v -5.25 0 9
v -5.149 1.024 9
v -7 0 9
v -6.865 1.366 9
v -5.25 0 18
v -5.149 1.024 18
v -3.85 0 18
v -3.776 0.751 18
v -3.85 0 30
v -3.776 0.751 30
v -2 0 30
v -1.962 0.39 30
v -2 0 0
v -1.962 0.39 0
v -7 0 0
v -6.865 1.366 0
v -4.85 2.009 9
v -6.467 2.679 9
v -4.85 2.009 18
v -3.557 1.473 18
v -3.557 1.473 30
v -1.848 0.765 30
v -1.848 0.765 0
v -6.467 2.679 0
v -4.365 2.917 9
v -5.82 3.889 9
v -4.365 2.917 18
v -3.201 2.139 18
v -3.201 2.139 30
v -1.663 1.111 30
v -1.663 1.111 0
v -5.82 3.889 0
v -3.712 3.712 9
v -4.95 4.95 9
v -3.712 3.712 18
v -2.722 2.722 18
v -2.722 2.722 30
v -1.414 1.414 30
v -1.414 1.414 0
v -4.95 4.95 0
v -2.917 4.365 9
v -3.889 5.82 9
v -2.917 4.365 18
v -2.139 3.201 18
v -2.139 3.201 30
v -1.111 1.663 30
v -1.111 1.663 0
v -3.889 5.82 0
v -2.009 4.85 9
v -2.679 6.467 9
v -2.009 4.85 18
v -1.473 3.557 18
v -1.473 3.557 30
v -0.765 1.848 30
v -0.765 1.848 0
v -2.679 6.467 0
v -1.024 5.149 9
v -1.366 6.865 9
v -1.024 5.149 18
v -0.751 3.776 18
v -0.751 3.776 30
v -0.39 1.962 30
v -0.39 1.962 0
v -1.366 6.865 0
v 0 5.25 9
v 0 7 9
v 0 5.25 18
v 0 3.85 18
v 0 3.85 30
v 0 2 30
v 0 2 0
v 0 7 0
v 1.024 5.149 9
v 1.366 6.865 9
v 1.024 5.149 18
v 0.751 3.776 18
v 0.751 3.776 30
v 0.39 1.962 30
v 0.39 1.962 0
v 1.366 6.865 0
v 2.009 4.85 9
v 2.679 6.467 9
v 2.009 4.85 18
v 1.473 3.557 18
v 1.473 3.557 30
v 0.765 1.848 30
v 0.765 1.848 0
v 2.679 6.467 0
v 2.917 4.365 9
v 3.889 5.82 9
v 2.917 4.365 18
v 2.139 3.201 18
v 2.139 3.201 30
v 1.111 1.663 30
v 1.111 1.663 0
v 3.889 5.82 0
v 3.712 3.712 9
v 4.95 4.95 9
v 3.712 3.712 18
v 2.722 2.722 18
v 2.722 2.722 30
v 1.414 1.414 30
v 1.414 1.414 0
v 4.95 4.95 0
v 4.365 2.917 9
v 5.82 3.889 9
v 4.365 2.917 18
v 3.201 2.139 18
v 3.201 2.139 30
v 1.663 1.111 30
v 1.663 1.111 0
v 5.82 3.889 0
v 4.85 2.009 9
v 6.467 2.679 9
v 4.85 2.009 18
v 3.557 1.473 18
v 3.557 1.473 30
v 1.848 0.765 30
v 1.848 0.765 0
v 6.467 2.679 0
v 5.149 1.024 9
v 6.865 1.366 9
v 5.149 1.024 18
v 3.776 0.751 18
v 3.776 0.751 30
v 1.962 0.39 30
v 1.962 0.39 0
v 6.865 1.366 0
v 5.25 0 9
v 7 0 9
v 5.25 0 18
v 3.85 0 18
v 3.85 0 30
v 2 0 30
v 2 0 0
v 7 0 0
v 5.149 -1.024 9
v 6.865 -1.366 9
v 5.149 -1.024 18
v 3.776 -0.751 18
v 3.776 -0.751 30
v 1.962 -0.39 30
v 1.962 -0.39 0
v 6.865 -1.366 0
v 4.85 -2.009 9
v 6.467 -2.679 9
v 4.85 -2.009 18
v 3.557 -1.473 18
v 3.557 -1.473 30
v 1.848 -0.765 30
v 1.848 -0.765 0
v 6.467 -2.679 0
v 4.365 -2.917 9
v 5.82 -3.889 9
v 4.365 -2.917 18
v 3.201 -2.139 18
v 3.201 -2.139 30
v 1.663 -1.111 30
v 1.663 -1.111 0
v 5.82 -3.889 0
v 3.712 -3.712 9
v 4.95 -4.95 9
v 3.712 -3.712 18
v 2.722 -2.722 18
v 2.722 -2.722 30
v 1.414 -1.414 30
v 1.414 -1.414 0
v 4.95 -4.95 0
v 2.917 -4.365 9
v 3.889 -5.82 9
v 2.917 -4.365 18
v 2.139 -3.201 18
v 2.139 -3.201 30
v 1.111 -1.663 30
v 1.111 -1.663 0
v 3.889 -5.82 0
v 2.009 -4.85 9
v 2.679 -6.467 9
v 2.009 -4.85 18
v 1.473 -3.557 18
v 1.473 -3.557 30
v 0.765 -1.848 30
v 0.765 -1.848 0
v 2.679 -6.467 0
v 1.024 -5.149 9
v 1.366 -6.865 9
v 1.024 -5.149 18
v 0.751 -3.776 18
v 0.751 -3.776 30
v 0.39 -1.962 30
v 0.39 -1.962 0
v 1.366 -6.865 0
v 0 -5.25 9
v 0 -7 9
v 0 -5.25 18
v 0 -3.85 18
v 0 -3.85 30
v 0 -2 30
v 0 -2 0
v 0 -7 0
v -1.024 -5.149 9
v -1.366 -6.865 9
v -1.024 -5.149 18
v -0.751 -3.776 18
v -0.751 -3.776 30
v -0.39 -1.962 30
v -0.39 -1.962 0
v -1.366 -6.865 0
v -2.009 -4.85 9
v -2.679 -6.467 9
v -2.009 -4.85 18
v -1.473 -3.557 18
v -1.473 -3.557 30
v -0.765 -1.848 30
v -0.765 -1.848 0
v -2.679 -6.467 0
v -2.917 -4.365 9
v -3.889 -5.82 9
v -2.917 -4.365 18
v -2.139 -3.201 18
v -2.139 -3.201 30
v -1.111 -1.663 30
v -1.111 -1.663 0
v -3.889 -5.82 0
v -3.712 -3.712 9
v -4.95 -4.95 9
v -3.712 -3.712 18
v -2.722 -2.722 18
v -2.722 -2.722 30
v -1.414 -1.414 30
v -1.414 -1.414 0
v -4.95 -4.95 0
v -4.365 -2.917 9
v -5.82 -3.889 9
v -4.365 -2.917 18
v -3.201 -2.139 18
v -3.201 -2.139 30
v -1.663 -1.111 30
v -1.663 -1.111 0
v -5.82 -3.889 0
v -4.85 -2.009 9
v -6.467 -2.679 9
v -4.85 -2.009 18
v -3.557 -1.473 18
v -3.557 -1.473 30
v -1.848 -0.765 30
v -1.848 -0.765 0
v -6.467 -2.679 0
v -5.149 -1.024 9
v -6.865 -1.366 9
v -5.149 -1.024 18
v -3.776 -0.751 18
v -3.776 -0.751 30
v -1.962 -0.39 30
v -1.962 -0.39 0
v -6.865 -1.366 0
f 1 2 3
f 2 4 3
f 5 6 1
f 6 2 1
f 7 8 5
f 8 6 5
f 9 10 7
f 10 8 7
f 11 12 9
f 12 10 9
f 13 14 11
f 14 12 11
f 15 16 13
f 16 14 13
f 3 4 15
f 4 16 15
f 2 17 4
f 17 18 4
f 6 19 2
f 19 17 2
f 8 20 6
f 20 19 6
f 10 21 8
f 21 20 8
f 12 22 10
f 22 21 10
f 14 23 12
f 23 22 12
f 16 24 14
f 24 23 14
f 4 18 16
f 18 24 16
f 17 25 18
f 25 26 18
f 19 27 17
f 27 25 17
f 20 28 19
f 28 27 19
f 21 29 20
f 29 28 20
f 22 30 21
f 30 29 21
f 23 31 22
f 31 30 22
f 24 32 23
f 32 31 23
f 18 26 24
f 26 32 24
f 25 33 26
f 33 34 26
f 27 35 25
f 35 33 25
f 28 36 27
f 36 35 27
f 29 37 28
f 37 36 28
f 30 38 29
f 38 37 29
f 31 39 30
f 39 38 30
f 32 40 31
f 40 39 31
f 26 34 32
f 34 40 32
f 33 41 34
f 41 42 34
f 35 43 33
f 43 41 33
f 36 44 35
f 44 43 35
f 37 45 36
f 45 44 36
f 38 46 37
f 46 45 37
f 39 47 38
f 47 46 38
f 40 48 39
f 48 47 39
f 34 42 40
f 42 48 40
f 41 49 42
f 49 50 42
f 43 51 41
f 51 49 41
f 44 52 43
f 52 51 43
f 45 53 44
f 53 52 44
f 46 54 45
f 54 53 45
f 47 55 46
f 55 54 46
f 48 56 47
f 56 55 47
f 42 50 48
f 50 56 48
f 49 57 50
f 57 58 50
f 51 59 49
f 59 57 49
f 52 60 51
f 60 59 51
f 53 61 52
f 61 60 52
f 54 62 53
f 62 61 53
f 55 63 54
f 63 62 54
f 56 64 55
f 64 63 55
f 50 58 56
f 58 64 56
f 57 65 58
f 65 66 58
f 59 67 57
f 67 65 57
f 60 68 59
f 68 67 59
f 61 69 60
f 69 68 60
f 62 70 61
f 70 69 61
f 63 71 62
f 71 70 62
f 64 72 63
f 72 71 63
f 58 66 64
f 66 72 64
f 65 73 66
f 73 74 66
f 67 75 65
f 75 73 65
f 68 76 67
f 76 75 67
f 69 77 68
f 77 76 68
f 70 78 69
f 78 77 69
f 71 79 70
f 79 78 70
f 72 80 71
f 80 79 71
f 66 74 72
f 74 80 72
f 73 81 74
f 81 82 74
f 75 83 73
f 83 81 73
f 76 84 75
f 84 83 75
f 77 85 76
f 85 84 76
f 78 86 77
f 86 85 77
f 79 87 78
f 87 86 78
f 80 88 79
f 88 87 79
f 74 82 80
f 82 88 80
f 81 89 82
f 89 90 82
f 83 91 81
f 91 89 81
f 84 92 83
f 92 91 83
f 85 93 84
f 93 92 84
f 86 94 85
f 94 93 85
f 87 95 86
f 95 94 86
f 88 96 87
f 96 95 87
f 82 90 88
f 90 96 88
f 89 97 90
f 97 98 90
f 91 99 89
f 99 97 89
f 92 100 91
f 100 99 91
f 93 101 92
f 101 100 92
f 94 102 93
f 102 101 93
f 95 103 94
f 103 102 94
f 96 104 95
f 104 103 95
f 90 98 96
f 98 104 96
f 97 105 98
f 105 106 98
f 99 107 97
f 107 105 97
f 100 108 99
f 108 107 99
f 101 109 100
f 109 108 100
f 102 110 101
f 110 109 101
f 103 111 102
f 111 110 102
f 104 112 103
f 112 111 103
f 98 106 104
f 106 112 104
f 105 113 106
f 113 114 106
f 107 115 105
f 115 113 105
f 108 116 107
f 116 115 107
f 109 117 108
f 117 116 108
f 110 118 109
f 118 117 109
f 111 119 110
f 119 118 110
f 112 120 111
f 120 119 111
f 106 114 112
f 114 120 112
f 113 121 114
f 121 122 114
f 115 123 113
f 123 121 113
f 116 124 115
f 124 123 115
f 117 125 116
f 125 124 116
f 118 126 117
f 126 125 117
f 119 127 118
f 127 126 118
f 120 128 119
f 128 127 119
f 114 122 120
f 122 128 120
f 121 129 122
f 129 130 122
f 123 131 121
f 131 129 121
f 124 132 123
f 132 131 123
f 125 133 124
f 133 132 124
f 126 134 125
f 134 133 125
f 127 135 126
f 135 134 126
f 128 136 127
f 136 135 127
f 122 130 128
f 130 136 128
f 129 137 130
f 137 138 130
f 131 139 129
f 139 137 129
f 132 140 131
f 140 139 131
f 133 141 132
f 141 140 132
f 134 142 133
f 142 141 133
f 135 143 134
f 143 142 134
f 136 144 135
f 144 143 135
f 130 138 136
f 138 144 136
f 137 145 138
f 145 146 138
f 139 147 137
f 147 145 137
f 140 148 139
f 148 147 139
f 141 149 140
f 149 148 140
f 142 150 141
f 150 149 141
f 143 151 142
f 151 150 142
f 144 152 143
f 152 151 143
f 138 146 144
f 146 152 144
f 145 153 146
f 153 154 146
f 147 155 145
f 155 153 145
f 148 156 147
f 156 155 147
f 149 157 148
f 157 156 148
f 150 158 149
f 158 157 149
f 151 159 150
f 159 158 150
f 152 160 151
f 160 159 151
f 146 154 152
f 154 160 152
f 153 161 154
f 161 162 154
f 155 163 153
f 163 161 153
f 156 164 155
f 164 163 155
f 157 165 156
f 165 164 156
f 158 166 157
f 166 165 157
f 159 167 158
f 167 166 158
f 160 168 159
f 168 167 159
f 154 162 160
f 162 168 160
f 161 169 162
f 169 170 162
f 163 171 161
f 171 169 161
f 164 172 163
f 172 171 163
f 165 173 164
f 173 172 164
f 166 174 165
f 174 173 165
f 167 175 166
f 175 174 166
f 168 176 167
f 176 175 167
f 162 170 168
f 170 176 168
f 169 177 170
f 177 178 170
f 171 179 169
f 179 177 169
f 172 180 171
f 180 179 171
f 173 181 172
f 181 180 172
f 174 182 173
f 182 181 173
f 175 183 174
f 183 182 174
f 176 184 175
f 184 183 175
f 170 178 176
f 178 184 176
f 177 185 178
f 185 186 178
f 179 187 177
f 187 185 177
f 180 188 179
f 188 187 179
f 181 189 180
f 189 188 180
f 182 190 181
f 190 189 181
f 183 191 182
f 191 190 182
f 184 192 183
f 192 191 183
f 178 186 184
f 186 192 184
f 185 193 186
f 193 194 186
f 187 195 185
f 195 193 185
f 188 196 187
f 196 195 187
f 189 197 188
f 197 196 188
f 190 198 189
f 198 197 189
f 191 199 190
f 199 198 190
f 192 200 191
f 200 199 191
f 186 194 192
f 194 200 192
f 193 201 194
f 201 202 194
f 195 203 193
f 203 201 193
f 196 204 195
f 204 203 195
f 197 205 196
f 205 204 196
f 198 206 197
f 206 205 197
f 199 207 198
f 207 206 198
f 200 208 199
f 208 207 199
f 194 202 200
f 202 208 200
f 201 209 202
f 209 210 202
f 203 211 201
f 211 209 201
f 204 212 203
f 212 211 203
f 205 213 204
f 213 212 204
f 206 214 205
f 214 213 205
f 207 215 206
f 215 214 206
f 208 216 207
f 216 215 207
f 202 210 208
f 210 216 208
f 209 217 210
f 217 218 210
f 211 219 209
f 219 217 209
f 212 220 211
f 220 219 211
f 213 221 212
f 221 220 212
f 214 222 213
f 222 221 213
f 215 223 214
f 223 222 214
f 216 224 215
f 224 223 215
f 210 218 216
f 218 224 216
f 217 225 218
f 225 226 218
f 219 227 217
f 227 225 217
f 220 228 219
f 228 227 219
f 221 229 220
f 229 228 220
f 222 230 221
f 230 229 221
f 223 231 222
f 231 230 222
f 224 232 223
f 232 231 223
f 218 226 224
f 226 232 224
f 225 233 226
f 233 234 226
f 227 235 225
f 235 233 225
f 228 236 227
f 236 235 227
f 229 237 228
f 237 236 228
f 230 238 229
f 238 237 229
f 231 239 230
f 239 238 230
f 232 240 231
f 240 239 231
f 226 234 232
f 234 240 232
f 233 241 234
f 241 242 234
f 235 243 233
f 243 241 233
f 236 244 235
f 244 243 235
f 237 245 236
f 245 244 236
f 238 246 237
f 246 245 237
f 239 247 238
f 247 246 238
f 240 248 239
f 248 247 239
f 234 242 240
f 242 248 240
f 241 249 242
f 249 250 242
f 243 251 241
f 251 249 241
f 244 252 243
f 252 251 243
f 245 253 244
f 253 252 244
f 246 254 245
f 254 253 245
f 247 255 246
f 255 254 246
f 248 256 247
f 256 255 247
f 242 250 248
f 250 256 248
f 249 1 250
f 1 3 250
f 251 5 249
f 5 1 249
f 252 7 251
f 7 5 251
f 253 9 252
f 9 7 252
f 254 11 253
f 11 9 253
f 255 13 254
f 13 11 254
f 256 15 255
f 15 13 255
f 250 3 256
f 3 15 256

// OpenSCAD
$fn = 32;

// ----------------------------------------------------------------------
// Profiled standoff: stepped spacer, 30 mm long, bore 4 mm
// ----------------------------------------------------------------------

// --- parameters (mm) ---
revolve_angle = 360;      // full turn around the Z axis
profile_points = 8;       // points of the closed outline

profile = [[2, 0], [7, 0], [7, 9], [5.25, 9], [5.25, 18], [3.85, 18], [3.85, 30], [2, 30]];  // single closed polygon, 8 points, counter clockwise

// --- the one profile operation ---
rotate_extrude(angle = revolve_angle) polygon(points = profile);
